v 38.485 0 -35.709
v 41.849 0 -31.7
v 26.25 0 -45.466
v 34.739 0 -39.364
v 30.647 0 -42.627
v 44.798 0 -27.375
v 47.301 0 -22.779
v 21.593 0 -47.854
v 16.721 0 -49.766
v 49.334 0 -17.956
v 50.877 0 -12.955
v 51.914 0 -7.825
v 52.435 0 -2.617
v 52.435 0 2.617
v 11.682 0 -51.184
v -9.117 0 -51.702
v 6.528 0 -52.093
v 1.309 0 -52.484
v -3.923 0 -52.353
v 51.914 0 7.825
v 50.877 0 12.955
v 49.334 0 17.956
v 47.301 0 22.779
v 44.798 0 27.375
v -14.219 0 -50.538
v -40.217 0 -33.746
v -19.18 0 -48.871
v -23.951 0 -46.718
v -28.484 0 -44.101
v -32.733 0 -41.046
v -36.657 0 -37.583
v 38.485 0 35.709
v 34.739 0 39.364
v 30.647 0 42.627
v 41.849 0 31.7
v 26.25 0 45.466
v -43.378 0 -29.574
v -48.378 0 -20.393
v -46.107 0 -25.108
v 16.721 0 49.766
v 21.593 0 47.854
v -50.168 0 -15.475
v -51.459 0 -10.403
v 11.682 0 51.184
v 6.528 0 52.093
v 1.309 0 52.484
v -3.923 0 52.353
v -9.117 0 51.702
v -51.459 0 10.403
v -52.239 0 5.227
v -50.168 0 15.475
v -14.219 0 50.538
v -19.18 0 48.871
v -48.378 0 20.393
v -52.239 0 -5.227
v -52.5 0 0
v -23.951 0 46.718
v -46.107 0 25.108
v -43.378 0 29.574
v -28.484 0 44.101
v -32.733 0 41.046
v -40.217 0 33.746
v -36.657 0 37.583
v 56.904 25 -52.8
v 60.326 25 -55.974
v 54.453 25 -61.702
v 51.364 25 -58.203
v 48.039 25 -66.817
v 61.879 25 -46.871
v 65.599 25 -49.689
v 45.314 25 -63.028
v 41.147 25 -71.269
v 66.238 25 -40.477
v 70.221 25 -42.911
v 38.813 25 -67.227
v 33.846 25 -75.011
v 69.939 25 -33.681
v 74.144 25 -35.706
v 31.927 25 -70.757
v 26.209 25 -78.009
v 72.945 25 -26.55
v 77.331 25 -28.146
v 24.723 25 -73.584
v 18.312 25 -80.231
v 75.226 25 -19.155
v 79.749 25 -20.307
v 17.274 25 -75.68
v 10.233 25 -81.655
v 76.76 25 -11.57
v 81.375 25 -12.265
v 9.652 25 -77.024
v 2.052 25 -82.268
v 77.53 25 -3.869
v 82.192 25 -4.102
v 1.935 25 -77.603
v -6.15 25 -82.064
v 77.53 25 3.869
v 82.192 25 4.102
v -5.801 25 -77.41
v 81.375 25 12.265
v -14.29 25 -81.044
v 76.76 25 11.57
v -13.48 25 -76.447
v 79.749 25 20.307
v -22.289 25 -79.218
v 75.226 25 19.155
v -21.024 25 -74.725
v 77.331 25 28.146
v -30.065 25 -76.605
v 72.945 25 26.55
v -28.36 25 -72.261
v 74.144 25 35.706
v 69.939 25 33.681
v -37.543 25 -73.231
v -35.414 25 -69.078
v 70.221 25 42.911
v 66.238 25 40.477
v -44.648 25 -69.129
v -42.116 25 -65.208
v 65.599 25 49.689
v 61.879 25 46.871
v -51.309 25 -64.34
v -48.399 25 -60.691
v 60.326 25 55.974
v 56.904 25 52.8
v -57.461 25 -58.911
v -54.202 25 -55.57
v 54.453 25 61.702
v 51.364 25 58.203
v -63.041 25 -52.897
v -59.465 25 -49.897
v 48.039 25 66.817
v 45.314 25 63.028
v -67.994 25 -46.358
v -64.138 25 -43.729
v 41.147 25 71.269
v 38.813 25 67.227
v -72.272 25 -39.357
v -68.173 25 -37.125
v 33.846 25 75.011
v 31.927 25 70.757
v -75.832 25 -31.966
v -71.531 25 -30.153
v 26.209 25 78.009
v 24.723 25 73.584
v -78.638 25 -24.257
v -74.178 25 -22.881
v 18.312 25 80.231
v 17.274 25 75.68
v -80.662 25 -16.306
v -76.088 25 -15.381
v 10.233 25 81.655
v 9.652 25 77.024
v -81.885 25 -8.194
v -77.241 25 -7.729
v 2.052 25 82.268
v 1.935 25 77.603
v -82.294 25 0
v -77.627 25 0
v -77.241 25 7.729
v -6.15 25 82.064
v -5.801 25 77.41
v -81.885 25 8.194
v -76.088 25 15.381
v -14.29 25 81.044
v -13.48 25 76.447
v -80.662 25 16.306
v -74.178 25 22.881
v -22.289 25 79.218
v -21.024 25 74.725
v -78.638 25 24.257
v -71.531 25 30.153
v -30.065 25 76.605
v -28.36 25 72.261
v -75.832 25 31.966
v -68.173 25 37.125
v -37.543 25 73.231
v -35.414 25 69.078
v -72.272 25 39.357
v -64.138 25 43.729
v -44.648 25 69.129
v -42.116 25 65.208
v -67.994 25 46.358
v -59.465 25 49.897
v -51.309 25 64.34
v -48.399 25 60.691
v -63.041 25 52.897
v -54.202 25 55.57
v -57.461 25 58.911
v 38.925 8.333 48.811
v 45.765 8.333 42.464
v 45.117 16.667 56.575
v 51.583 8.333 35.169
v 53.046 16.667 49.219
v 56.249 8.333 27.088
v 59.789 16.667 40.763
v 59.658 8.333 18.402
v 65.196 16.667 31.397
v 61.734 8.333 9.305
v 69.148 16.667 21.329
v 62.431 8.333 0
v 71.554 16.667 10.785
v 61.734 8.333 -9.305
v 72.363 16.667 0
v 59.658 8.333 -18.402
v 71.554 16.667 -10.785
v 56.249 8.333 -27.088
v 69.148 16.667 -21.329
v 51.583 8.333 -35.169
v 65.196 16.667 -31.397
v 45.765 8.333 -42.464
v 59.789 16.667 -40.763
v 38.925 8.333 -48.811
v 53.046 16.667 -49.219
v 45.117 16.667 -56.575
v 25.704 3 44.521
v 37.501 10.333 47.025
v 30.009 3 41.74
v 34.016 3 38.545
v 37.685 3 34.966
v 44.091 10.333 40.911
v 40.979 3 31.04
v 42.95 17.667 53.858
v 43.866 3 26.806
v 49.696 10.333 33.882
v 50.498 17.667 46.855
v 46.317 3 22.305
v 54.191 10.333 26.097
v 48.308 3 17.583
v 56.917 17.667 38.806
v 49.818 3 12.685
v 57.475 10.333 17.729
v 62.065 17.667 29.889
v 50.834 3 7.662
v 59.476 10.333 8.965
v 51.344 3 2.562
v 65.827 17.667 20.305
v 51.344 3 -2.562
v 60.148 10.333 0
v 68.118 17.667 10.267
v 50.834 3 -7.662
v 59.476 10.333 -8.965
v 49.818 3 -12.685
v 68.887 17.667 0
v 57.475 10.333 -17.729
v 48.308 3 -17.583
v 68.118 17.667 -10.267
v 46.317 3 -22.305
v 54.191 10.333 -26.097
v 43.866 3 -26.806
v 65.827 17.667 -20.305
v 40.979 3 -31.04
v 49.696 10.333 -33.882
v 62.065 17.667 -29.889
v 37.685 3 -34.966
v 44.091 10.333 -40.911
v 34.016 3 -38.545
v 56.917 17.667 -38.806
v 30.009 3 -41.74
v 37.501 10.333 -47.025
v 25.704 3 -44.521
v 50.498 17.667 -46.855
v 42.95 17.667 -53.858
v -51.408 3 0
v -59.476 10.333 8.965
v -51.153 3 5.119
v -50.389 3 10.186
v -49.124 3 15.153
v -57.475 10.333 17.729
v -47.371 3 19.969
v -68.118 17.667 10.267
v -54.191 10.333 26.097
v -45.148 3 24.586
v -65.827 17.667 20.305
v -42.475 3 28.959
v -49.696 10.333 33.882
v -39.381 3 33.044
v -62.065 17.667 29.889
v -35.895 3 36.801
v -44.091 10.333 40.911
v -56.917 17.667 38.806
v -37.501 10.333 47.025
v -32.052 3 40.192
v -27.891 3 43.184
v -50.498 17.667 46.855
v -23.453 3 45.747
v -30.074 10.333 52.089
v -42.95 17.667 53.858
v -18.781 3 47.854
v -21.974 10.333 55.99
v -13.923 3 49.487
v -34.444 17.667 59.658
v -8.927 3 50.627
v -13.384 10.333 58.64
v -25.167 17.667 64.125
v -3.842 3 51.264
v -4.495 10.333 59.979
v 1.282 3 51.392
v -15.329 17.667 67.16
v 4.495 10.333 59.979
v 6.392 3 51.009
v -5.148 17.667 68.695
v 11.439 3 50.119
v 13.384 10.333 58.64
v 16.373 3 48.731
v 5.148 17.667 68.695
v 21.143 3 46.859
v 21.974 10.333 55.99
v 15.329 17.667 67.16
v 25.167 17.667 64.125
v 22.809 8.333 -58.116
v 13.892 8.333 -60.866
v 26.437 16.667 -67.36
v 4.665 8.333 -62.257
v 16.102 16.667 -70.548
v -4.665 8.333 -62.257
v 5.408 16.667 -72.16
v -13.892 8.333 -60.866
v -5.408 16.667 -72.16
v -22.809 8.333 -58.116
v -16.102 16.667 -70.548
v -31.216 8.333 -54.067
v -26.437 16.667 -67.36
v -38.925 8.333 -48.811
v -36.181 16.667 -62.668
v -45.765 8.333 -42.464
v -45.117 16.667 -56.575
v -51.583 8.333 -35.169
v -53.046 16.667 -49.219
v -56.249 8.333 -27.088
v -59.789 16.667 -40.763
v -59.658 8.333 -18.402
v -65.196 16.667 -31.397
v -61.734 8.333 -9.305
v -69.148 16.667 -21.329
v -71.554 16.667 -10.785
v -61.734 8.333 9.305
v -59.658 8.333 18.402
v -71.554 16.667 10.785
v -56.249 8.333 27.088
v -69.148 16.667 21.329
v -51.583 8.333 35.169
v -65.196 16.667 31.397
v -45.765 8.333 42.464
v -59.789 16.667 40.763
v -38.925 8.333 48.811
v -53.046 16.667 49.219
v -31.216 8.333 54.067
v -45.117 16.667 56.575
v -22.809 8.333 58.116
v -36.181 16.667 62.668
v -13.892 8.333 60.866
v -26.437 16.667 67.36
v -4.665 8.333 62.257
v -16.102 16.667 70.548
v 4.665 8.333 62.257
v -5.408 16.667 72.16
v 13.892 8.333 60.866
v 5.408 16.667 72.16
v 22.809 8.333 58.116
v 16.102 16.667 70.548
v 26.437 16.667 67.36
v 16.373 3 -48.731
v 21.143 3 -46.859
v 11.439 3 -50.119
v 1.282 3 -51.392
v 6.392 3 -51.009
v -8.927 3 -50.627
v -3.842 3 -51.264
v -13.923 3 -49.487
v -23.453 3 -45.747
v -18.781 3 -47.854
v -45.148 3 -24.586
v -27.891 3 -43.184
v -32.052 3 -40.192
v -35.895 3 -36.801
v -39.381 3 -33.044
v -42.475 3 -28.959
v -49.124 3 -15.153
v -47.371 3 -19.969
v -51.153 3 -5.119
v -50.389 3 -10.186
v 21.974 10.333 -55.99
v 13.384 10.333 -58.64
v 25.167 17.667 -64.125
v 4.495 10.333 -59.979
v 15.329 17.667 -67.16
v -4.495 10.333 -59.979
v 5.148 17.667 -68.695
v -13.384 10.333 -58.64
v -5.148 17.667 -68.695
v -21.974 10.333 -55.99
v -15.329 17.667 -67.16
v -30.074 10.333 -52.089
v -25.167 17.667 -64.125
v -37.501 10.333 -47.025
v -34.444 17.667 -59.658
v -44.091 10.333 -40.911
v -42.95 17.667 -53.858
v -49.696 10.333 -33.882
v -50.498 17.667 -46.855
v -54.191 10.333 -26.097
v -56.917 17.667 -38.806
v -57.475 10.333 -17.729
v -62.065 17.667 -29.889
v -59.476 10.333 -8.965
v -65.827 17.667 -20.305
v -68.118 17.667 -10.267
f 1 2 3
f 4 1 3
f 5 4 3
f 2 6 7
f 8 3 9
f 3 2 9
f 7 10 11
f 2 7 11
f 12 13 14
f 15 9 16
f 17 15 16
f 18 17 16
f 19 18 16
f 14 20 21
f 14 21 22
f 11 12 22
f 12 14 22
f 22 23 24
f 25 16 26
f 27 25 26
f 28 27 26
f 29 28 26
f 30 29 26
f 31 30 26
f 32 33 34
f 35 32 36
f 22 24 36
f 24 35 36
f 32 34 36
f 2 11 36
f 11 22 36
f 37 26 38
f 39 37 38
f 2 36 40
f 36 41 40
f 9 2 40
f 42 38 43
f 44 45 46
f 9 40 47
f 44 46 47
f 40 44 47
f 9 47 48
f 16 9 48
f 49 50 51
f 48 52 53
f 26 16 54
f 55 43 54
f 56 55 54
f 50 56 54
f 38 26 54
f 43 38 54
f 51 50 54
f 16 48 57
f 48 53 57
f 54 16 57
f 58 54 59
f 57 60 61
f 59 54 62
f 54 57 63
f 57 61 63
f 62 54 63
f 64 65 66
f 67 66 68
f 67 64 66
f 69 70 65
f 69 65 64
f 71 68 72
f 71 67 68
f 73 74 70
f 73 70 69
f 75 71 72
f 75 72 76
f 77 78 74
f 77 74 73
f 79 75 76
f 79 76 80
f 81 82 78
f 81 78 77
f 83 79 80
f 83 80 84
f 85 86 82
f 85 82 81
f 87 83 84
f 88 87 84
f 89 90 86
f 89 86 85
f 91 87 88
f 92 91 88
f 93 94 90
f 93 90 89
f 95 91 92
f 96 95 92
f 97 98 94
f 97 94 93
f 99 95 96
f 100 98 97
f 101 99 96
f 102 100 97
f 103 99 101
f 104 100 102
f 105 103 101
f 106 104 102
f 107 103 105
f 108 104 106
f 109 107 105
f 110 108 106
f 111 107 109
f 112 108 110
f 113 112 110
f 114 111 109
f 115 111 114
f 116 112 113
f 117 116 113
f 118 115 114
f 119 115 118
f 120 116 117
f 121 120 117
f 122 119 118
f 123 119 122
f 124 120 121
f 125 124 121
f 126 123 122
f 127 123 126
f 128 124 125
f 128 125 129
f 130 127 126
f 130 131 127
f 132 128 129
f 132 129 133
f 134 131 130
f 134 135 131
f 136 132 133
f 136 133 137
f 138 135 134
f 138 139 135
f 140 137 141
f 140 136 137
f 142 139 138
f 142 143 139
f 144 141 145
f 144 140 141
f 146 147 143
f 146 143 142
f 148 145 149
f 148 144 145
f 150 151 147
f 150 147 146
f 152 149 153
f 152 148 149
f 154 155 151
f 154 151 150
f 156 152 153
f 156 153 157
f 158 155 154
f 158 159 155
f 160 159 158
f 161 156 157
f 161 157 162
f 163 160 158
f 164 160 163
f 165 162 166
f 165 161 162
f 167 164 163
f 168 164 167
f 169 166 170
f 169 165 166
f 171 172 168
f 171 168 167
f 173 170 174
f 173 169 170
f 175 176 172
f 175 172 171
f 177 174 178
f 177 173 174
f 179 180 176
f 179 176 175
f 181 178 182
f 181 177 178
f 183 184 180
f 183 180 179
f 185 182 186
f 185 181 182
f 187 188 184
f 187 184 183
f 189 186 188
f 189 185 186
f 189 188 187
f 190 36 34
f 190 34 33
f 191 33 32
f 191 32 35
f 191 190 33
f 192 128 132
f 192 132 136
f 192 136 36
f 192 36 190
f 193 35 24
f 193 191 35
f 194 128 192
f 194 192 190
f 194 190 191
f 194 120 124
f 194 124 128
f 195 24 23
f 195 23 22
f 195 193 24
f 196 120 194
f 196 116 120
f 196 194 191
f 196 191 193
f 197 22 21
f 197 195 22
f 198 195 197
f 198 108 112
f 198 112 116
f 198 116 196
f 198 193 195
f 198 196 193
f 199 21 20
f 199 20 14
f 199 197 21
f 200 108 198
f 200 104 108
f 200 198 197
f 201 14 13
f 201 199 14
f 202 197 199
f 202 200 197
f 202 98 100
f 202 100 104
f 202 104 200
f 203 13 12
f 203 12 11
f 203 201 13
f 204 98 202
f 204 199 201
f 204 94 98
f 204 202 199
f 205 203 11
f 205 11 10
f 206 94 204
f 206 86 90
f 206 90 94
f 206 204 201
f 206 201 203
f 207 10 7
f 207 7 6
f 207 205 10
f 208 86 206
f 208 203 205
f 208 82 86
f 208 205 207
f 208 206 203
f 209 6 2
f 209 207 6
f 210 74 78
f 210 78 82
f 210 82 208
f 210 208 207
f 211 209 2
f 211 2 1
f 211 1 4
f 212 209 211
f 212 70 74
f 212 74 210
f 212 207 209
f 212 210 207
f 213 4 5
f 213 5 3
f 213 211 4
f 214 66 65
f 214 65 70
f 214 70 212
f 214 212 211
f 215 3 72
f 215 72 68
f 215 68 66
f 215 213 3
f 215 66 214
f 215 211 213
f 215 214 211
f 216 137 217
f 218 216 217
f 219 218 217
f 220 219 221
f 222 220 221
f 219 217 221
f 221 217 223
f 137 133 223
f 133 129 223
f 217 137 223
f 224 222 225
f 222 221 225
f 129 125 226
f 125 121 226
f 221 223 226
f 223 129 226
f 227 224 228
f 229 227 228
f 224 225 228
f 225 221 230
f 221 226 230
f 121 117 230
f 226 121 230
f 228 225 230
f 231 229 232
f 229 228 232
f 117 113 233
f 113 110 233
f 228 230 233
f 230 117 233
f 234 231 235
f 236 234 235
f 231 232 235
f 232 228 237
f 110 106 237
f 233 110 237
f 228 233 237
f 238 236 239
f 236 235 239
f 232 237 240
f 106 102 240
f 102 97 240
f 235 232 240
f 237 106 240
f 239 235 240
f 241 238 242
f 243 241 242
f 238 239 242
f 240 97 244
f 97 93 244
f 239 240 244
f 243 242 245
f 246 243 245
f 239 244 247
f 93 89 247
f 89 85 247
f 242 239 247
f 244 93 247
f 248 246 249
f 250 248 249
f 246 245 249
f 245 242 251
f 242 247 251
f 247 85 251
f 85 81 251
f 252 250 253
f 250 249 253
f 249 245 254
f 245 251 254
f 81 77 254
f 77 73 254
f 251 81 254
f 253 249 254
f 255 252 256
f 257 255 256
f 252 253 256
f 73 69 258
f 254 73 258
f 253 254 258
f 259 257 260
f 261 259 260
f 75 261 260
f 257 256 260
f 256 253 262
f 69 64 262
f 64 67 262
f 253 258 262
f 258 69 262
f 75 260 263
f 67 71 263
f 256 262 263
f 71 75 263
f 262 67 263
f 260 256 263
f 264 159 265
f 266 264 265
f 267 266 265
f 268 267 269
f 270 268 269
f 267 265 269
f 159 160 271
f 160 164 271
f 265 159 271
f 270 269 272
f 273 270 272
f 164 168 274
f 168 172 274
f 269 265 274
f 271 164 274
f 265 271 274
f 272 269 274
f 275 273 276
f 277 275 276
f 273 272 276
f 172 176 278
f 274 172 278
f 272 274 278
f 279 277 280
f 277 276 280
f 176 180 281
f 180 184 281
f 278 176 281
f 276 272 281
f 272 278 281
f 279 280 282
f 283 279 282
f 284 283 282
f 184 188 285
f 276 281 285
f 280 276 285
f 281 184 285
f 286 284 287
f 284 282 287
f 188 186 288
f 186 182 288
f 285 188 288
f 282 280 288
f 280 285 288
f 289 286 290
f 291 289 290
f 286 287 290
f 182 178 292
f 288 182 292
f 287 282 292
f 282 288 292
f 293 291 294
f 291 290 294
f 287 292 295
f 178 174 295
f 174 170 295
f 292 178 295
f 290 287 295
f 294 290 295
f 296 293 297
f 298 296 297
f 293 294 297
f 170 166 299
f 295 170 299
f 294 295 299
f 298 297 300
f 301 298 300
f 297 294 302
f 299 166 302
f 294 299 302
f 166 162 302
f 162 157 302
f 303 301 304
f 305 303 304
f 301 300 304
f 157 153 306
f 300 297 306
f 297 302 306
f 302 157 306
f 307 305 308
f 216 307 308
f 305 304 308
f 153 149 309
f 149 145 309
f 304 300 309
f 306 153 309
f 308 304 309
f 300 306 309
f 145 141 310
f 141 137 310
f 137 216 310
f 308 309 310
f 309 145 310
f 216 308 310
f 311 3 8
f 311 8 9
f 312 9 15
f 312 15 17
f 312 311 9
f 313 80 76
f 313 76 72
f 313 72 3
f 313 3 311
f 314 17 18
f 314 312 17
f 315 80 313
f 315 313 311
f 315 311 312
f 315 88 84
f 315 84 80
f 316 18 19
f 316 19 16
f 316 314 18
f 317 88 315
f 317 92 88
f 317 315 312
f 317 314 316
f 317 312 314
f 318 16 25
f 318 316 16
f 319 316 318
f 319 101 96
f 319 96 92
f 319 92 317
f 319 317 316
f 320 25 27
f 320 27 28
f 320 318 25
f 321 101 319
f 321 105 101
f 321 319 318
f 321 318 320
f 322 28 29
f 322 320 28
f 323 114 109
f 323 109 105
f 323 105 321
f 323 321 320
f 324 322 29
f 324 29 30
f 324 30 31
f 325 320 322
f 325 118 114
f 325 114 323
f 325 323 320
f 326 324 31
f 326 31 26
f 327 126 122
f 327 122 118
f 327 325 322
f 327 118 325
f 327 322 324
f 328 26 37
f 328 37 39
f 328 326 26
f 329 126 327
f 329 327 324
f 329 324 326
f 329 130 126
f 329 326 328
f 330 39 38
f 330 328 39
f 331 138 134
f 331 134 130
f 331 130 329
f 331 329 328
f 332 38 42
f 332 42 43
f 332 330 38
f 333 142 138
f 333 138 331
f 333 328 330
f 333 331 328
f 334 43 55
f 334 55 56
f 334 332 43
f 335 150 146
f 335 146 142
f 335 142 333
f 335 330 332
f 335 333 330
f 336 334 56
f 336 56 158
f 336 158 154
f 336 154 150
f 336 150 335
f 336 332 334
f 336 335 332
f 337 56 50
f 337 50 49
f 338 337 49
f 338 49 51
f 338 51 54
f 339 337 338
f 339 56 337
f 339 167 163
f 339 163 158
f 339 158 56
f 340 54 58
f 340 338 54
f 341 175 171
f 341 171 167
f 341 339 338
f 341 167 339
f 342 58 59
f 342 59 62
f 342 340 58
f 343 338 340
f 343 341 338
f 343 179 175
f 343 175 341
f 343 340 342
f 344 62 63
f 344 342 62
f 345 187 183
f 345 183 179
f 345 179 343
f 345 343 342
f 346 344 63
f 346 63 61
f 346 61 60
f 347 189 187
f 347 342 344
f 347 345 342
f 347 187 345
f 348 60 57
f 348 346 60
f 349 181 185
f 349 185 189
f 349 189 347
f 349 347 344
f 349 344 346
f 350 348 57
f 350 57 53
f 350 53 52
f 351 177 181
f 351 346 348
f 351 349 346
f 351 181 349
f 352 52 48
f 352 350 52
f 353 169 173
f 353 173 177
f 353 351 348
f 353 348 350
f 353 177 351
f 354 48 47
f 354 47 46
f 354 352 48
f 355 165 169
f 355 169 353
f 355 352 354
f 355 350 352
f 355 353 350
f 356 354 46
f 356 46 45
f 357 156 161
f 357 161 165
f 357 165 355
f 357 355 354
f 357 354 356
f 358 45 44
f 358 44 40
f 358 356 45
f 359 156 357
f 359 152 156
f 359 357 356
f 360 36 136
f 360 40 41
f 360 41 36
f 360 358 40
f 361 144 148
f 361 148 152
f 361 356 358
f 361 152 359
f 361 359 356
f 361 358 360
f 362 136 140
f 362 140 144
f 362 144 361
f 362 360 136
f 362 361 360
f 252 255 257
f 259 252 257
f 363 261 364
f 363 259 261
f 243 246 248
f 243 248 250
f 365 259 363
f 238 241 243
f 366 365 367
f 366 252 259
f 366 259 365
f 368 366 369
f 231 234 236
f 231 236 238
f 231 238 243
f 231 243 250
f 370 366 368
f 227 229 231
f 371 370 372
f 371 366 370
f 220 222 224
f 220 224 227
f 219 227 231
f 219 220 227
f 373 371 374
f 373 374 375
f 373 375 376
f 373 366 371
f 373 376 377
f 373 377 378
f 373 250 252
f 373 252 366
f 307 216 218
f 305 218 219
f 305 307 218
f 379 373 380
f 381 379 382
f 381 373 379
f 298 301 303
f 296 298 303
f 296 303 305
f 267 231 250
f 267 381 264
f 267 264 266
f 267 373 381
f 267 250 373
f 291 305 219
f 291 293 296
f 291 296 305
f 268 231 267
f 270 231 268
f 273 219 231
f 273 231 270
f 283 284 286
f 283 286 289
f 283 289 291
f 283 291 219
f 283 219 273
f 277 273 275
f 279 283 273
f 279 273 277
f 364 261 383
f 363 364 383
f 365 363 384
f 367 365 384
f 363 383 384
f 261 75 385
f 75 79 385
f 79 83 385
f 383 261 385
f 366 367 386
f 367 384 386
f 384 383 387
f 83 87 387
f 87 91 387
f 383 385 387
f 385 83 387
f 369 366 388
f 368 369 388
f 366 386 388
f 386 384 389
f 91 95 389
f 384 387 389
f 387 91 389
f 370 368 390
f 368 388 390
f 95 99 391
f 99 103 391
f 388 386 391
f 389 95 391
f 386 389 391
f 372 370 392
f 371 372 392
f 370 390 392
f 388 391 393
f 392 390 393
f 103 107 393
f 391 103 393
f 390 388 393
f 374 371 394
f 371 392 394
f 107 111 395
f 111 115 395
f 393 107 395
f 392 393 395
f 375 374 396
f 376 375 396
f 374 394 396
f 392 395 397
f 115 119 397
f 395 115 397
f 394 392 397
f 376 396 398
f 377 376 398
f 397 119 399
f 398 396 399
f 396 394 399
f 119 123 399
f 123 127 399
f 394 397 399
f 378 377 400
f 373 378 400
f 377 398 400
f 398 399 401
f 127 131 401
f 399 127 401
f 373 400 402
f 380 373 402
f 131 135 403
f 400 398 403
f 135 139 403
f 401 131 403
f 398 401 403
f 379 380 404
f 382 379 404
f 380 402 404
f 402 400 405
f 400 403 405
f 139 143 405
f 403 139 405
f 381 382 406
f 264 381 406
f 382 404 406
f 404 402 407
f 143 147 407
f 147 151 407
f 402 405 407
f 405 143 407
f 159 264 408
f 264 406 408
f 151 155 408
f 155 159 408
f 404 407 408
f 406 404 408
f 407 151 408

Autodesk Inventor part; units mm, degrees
ref_plane "YZ Plane" through (0, 0, 0) normal (1, 0, 0) x (0, 1, 0)
ref_plane "XZ Plane" through (0, 0, 0) normal (0, 1, 0) x (-1, 0, 0)
ref_plane "XY Plane" through (0, 0, 0) normal (0, 0, 1) x (1, 0, 0)
sketch "Boceto1" plane through (0, 0, 0) normal (0, 1, 0) x (-1, 0, 0)
  circle A0 centre (0, 0) radius 80
  circle A1 centre (0, 0) radius 52.5
  dimension "d0" = 160
  dimension "d4" = 105
extrude "Extrusión1" add sketch "Boceto1" along normal blind 25 draft 50 contours A1
shell "Vaciado1" thickness 3 removed faces 1 at (12.2178, 25, 3.7687)
properties part number "Cuenco"
